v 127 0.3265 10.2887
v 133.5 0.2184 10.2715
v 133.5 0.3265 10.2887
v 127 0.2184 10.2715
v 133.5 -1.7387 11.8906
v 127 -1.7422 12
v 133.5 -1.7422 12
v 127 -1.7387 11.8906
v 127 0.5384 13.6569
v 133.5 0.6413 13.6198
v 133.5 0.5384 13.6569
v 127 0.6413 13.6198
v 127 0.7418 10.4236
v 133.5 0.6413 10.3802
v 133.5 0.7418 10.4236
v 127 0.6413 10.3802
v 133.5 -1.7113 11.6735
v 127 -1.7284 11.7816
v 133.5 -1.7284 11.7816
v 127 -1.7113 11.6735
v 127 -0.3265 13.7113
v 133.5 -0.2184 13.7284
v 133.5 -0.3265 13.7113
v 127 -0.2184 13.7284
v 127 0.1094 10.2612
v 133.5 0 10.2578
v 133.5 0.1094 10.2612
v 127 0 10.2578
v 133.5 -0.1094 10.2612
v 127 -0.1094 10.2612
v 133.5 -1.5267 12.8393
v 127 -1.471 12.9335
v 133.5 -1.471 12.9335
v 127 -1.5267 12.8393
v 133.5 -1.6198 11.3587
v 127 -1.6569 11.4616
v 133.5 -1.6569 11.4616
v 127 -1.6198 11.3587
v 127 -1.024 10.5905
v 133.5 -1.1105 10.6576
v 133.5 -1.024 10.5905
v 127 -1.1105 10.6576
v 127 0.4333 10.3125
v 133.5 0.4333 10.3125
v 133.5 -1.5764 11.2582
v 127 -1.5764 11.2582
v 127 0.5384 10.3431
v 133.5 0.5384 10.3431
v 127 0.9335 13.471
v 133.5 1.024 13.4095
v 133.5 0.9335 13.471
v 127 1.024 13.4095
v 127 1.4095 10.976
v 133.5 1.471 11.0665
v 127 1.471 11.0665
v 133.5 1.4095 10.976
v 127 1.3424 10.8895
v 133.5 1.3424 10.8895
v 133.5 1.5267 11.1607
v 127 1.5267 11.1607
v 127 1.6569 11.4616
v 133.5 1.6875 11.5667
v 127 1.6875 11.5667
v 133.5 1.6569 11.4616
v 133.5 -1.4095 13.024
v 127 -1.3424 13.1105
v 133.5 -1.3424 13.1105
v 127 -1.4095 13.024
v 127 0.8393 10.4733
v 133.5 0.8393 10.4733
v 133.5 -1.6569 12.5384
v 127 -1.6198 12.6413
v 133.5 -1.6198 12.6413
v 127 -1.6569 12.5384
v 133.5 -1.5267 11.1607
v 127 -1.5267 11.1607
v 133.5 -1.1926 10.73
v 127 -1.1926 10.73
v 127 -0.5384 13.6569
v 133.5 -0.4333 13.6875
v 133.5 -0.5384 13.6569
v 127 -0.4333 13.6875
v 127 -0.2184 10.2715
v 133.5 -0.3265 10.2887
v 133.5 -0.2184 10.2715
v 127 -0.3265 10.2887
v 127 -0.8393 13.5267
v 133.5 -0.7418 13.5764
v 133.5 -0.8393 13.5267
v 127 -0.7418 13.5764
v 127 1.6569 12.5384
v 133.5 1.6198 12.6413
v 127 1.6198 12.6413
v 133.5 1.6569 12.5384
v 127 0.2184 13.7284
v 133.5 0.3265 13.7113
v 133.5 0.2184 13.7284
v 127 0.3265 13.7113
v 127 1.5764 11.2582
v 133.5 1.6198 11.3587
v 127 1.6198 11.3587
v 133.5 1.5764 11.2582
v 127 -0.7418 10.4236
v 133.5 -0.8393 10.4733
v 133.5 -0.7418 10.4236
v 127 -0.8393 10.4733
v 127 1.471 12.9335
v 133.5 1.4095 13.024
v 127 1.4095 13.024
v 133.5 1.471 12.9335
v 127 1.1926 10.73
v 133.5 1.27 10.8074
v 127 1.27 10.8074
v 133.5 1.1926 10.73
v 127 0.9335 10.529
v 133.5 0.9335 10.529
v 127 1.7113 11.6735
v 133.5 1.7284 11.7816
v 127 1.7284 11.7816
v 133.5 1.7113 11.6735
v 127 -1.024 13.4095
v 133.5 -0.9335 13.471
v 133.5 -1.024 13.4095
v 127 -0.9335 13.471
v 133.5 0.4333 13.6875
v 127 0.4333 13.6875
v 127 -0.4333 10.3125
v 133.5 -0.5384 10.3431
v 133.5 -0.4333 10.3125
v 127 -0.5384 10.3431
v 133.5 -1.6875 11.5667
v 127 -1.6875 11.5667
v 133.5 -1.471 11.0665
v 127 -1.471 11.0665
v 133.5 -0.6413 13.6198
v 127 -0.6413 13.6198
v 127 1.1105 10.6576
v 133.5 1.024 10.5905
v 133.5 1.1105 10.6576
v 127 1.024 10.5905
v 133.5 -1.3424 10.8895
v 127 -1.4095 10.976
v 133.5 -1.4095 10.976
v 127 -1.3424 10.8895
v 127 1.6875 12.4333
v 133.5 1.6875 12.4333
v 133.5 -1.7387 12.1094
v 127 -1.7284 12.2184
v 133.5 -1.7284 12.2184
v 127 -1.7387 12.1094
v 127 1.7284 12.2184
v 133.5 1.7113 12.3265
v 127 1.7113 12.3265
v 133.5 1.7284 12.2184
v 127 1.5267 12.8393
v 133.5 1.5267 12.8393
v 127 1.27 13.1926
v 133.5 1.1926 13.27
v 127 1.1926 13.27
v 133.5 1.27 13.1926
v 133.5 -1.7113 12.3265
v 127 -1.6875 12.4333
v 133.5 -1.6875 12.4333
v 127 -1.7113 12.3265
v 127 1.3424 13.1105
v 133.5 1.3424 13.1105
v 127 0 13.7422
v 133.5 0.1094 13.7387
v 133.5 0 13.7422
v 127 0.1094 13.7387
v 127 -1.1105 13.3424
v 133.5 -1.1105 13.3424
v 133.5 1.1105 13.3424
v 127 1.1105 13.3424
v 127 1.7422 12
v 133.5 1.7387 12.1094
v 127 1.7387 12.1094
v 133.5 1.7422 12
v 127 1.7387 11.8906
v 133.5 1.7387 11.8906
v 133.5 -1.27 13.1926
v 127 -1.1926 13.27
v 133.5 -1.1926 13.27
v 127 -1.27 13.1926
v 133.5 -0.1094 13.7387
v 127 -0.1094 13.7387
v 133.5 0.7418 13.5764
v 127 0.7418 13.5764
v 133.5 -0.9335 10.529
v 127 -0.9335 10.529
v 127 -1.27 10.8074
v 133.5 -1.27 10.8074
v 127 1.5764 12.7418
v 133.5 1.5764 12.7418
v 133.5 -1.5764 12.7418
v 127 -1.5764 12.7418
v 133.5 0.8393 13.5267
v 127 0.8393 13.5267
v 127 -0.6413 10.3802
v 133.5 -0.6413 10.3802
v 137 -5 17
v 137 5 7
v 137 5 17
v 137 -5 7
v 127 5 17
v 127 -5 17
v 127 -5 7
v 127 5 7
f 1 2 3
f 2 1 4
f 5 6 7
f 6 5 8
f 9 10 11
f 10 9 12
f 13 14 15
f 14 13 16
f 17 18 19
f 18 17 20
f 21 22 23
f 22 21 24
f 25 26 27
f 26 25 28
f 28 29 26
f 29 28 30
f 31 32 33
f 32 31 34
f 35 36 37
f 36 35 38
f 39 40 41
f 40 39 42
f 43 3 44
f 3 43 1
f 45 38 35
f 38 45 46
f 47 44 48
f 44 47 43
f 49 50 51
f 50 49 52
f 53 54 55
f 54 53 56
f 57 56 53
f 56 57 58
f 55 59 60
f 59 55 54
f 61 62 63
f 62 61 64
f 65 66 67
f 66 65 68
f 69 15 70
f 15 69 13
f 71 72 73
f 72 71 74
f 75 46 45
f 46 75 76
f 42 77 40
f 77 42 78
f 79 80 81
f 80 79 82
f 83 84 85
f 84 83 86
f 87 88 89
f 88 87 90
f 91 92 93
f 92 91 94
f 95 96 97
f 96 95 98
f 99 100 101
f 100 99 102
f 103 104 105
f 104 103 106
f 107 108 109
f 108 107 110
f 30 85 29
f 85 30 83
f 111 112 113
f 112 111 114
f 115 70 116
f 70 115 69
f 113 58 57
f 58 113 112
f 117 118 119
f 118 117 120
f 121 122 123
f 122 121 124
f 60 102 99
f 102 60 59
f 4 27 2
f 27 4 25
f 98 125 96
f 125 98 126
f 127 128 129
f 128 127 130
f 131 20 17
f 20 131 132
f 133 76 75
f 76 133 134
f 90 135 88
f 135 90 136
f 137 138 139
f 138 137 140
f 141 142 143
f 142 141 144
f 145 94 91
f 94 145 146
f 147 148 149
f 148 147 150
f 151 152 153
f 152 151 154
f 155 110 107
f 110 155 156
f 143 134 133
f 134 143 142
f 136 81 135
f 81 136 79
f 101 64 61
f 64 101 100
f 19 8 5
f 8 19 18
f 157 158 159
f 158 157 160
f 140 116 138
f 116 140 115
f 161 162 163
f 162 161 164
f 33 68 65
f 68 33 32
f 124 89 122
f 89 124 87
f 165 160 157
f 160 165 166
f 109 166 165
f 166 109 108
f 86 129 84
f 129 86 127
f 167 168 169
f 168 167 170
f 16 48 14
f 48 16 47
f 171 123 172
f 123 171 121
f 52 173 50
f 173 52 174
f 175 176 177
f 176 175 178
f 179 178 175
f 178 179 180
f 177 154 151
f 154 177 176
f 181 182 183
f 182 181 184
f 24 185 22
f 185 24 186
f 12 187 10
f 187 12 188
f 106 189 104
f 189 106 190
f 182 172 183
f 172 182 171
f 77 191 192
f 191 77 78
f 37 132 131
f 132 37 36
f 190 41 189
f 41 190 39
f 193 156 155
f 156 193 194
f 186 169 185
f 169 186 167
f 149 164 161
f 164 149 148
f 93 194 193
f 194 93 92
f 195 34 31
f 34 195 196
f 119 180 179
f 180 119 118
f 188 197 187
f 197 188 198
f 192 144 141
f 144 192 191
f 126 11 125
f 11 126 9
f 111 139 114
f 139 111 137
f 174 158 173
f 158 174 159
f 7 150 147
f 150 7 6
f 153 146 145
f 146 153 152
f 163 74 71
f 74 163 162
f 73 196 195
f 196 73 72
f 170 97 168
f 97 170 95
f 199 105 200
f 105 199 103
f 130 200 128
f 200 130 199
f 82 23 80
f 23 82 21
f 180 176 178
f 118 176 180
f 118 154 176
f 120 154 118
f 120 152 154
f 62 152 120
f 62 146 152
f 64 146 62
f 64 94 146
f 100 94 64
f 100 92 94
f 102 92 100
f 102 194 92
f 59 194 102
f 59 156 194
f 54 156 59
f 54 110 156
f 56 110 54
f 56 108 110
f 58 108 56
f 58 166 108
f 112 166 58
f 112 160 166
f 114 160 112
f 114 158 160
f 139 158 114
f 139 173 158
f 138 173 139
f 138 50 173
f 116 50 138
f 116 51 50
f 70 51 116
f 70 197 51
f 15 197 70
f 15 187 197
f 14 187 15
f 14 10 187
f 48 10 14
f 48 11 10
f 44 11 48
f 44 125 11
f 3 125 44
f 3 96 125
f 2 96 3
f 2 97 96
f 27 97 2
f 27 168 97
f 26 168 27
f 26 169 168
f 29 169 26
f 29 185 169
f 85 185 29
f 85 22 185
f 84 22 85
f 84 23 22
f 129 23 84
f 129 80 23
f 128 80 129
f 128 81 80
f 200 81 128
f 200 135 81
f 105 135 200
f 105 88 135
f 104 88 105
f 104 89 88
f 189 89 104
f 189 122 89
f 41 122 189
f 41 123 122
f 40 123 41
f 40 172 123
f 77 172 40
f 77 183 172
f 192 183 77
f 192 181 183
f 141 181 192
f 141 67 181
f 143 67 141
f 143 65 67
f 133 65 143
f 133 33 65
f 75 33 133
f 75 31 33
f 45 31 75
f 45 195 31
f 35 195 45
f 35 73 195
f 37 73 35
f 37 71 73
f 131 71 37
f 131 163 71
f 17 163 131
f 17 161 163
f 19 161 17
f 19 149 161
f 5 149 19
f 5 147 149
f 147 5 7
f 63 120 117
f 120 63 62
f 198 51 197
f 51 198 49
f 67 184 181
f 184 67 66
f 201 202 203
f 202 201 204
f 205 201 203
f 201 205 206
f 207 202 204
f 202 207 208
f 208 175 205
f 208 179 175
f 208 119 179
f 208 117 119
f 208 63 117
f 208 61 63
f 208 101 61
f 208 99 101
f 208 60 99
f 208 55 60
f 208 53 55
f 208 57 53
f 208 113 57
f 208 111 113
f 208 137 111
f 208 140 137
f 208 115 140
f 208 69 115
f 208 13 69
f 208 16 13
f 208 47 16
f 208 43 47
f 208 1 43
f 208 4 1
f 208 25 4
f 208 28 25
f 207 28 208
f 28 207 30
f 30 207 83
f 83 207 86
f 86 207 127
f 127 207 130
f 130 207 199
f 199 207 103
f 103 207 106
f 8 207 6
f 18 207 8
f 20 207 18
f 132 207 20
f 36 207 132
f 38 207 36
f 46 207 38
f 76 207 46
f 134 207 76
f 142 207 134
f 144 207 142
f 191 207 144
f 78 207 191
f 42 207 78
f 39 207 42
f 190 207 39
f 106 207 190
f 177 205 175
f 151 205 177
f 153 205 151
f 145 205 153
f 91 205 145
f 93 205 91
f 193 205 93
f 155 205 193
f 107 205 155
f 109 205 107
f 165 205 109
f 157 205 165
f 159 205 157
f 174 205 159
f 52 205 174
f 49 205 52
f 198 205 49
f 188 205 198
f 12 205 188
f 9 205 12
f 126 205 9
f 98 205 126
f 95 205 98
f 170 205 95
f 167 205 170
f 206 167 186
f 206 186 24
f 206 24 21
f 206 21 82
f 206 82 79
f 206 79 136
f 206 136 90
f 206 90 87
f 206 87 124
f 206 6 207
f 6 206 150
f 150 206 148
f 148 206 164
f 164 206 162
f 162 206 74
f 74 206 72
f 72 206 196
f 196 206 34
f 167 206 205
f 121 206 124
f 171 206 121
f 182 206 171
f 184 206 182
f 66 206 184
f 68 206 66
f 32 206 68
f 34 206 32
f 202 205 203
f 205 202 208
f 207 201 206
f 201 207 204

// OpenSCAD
// file: ../hex_nut.scad
// 1.5^2 + y^2 = 3^2
// sqrt(3^2 - 1.5^2)
//       30
//    /   |
// 60  - 90
// cos(30) = x / 3
// x = 3 cos(30)
module hex(side_length=4) {
  points = [[0,0], [side_length, 0], [side_length / 2, side_length * cos(30)]];
  for (i=[0:1:5]) {
    rotate([0,0,i * 60]) polygon(points);
  }
}

module hex_nut(side_length=3, height=2) {
    linear_extrude(height=height) hex(side_length);

}
// file: ../cr_boxes/handle.scad
use <../smoothed_cube.scad>
use <../screw_with_nut.scad>

$fn = 100;
x = 40.2;
y = 25.4;
z = 5;
h = 127;

function get_x_handle() = x;
threaded_height = 8;


module top() {
  translate([-x / 2 ,-y / 2,-z / 2]) {
    smoothed_cube(x=x, y = y, z=z);
  }
}

module screw_holder(x=5, y=y, z=y, radius=5) {
  translate([-x / 2 ,-y / 2,-z / 2]) {
    smoothed_cube(
      x=x, y = y, z=z,
      radius_3=radius,
      radius_7=radius,
      edge_2_3_radius=radius,
      edge_3_7_radius=radius,
      edge_3_4_radius=radius,
      edge_6_7_radius=radius,
      edge_7_8_radius=radius
    );
  }
}

module handle(screws_only=false) {
  if (screws_only) {
    screws_for_handle();
  } else {

    cylinder(h=h, r=25.4 / 2, center=true);
    difference() {
      union() {

        translate([-x,0,-h / 2 - 8]) {
          screw_holder();
        }

        mirror([0,0,1])
          translate([-x,0,-h / 2 - 8]) {
            screw_holder();
          }

        translate([-x / 2,0, h / 2 - z / 2]) {
          top();
        }

        mirror([0,0,1])
          translate([-x / 2,0, h / 2 - z / 2]) {
            top();
          }
      }
      screws_for_handle();
    }
  }
}

module screws_for_handle() {
  screw_handle();
  mirror([0,0,1])
    screw_handle();
}

module screw_handle(screw_offset=5) {
  translate([-x + threaded_height - screw_offset,0,h / 2 + y /2  -2]) {
    color([1,0,0])
      rotate([0,-90,0])
      screw_with_nut(threaded_height=threaded_height);
  }
}

handle();
// file: ../cr_boxes/corner.scad
use <builder.scad>
use <row_fan.scad>

filter_y = filter_dim()[1];
fan_size = get_fan_size();
depth = get_depth();
corner_z = get_corner_z();



module corner() {
  difference() {

    // translate([-depth, -(filter_y * 2 + fan_size) / 2, 0]) {
    union() {

      cube([depth,filter_y * 2 + fan_size,corner_z], center=true);

      mirror([0,1,0])
      translate([(get_spacing_x() + get_fan_size()) / 2 + 0.5,0, -corner_z / 2 + depth / 2]) {
        cylinder_cube_screw(cyl=false, screw=false, cube_support=true);
      }

      // cylinder 2
      translate([get_spacing_x() - 0.5,0,0]) {
        translate([(get_spacing_x() + get_fan_size()) / 2 + 0.5,0, -corner_z / 2 + depth / 2]) {
          cylinder_cube_screw(cyl=true, screw=false, cube_support=false);
        }
      }

      // cylinder 3 top
      translate([22,0,40]) {
        rotate([0,90,0])
          mirror([0,1,0])
          translate([get_spacing_x() - 0.5,0,0]) {
            translate([(get_spacing_x() + get_fan_size()) / 2 + 0.5,0, -corner_z / 2 + depth / 2]) {
              cylinder_cube_screw(cyl=true, screw=false, cube_support=false);
            }
          }
      }

      // cube top
    }
    union() {


      // cylinder screw hole 1
      mirror([0,1,0])
        translate([(get_spacing_x() + get_fan_size()) / 2 + 0.5,0, -corner_z / 2 + depth / 2]) {
          cylinder_cube_screw(cyl=true, screw=true, cube_support=false);
        }

      // cylinder 2 screw hole
      translate([get_spacing_x() - 0.5,0,0]) {
        translate([(get_spacing_x() + get_fan_size()) / 2 + 0.5,0, -corner_z / 2 + depth / 2]) {
          cylinder_cube_screw(cyl=false, screw=true, cube_support=false);
        }
      }

      // cylinder 3 screw hole
      translate([22,0,40]) {
        rotate([0,90,0])
          mirror([0,1,0])
          translate([get_spacing_x() - 0.5,0,0]) {
            translate([(get_spacing_x() + get_fan_size()) / 2 + 0.5,0, -corner_z / 2 + depth / 2]) {
              cylinder_cube_screw(cyl=false, screw=true, cube_support=false);
            }
          }
      }

      // cylinder 4 screw hole and cylinder
      translate([22,0,23]) {
        rotate([0,90,0])
          translate([(get_spacing_x() + get_fan_size()) / 2 + 0.5,0, -corner_z / 2 + depth / 2]) {
            cylinder_cube_screw(cyl=true, screw=true, cube_support=false);
          }
      }
    }
  }
}

corner();
// file: ../fan.scad
use <hex_nut.scad>
$fn = 100;

// | 70
// |
// |
// |
// |        62.5
// -------------

module fan(
    radius,
    depth,
    screw_radius,
    multiplier = 70 - 7.5
) {
  _distance_to_middle_of_circle_x = radius == 60 ? 52.5 : multiplier / 70 * radius;
  _distance_to_middle_of_circle_y = radius == 60 ? 52.5 : multiplier / 70 * radius;

  linear_extrude(height=depth) circle(radius);
  // top right corner
  translate([_distance_to_middle_of_circle_x, _distance_to_middle_of_circle_y, 0]) {
    linear_extrude(height=depth) circle(screw_radius);
  }

  // bottom left corner
  translate([-_distance_to_middle_of_circle_x, -_distance_to_middle_of_circle_y, 0]) {
    linear_extrude(height=depth) circle(screw_radius);
  }

  // bottom right corner
  translate([_distance_to_middle_of_circle_x, -_distance_to_middle_of_circle_y, 0]) {
    linear_extrude(height=depth) circle(screw_radius);
  }

  // top left corner
  translate([-_distance_to_middle_of_circle_x, _distance_to_middle_of_circle_y, 0]) {
    linear_extrude(height=depth) circle(screw_radius);
  }

  // hex nut 1
  translate([_distance_to_middle_of_circle_x, _distance_to_middle_of_circle_y, depth - 2]) {
    hex_nut(4);
  }

  // hex nut 2
  translate([-_distance_to_middle_of_circle_x, -_distance_to_middle_of_circle_y, depth - 2]) {
    hex_nut(4);
  }

  // hex nut 3
  translate([_distance_to_middle_of_circle_x, -_distance_to_middle_of_circle_y, depth - 2]) {
    hex_nut(4);
  }

  // hex nut 4
  translate([-_distance_to_middle_of_circle_x, _distance_to_middle_of_circle_y, depth - 2]) {
    hex_nut(4);
  }
}

fan(radius=60, depth=5, distance_to_middle_of_circle_x=62/70 * 60, distance_to_middle_of_circle_y=62/70 * 60);
// file: foot.scad
use <../screw_with_nut.scad>
$fn = 100;

module cone(width=5, height=10, cone_top_radius=8) {
  rotate_extrude(convexity=10, angle=360)
    polygon([[0,0], [width,0], [cone_top_radius, height], [0,height]]);
}

module foot(fan_size=120, screw=false, height=10, screw_head_height=5) {
  if (screw) {
    rotate([-90,0,0]) screw_with_nut(nut_type="hex", threaded_height=10, screw_head_height=screw_head_height);
  } else {
    rotate([-90,0,0]) difference() {
      cone(height=height);
      screw_with_nut(nut_type="hex", threaded_height=10, screw_head_height=screw_head_height);
    }
  }
}


foot();
// screw_with_nut(nut_type="none", threaded_height=10);
// file: ../usbc_female.scad
$fn=100;
function usbc_radius() = 3.25;
function usbc_middle_width() = 6.5;
function usbc_width() = 2 * usbc_radius() + usbc_middle_width();

module usbc_female() {
  // left half cylinder
  rotate([-90,0,0]) cylinder(h=20, r=usbc_radius());

  translate([0,0,-usbc_radius()]) {
    cube([7,20,usbc_middle_width()]);
  }

  // right half cylinder
  translate([7,0,0]) {
    rotate([-90,0,0]) cylinder(h=20, r=usbc_radius());
  }
}

usbc_female();
// file: ../cr_boxes/builder.scad
use <../smoothed_cube.scad>
use <../screw_with_nut.scad>
use <../fan.scad>
use <row_fan.scad>
use <corner.scad>
use <handle.scad>

filter_x = 635;
filter_z = 406;
filter_y = 25;
fan_z = 27;
num_fans = 4;
fan_size = 140;
depth = 10;

function filter_dim() = [filter_x, filter_y, filter_z];
function get_fan_size() = fan_size;
function get_num_fans() = num_fans;
function get_depth() = depth;
function get_spacing_x() = (filter_x / get_num_fans() - get_fan_size() )/ 2;
function get_spacing_y() = (filter_y / get_num_fans() - get_fan_size() )/ 2;
function get_fan_holder_x() = get_spacing_x() * 2 + get_fan_size();
function num_fans_to_fit(dim) = floor(dim / get_fan_holder_x());
function get_corner_z() = (filter_z + 2 * depth - 2 * (get_spacing_x() * 2 + get_fan_size())) / 2;;

module local_fan(z_offset="None", size=140, z=27, _color=[1,1,1], depth=10) {
  _z_offset = z_offset == "None" ? filter_z : z_offset;

  translate([0,0, filter_z]) {
    color(_color)
    cube([size,size,z]);

    // translate([0,0,50]) {
      // rotate([180,0,0])
      // screw_with_nut(threaded_height=8, hex_nut_side_length=4.5);
    // }
  }

  // main cylinder plus screws
  translate([fan_size / 2, fan_size / 2,_z_offset + fan_z  + 10]) {
    rotate([180,0,0])
    fan(size / 2, depth, screw_radius=2.5);
    // color(_color)
    // cylinder(h=depth, r=size / 2);
  }
}

module filter(filter_x=635, filter_y=25, filter_z=406) {
  cube([filter_x, filter_y, filter_z]);
}

module top_or_bottom_panel() {
  smoothed_cube(
      x=filter_x + 2 * depth,
      y=2 * filter_y + fan_size,
      z=depth,
      radius_1=depth,
      radius_4=depth,
      radius_5=depth,
      radius_8=depth,
      edge_4_1_radius=depth,
      edge_1_5_radius=depth,
      edge_8_5_radius=depth,
      edge_4_8_radius=depth
      );
}

module fans() {
  translate([get_spacing_x() + get_fan_size() / 2, 0,0]) {
    for (x=[0:1:get_num_fans() - 1]) {
      translate([(get_spacing_x() * 2 + get_fan_size()) * x,0,0]) {
        row_fan();
      }
    }
  }
}

module vertical_wall(with_handle=false, row_wall_index=0) {

  if (!with_handle) {
    translate([- depth / 2,0, get_fan_holder_x() / 2]) {
      rotate([0,-90,0]) {
        for (x=[0:1: num_fans_to_fit(filter_z) - 1]) {
          translate([(get_spacing_x() * 2 + get_fan_size()) * x,0,0]) {
            row_fan(fan_hole=false);
          }
        }
      }
    }
  } else {
    difference() {
      translate([- depth / 2,0, get_fan_holder_x() / 2]) {
        rotate([0,-90,0]) {
          translate([(get_spacing_x() * 2 + get_fan_size()) * row_wall_index,0,0]) {
            row_fan(fan_hole=false);
          }
        }
      }

      translate([-get_x_handle() - 15,0,get_spacing_x() * 2 + get_fan_size()]) {
        color([0,0,1])
          rotate([0,0,180])
          handle(screws_only=true);
      }
    }
  }
}

module filters() {
  filter();
  translate([0,fan_size + filter_y,0]) {
    filter();
  }
}


translate([0,0,filter_z + 5 + depth]) {
  fans();
}

// bottom fans
translate([0,0,depth / 2]) {
  mirror([0,0,1])
   fans();
}

translate([0,-filter_y -get_fan_size() / 2, depth]) {
  filters();
}

// echo("get_fan_holder_x()", get_fan_holder_x());
// echo("num_fans_to_fit(filter_z)", num_fans_to_fit(filter_z));

corner_z = get_corner_z();
echo("corner_z:", corner_z);

translate([-get_depth() / 2,0, corner_z / 2]) {
  // corner();
}

translate([-get_depth() / 2, 0, corner_z + 2 * (get_spacing_x() * 2 + get_fan_size())]) {
  corner();
}

translate([0,0,corner_z]) {
  vertical_wall();
}
// file: ../cr_boxes/row_fan.scad
use <builder.scad>
use <../smoothed_cube.scad>
use <../screw_with_nut.scad>

$fn = 100;

filter_x = filter_dim()[0];
filter_y = filter_dim()[1];
filter_z = filter_dim()[2];

width = filter_x / get_num_fans();
spacing_x = get_spacing_x();
spacing_y = filter_y;

module top(x, y, z, depth, corners_smoothed=false, x_edges_smoothed=false,
    x_spacing=10,
    y_spacing=10,
    z_spacing=10,
    edge_fan_top_smoothed=false,
    edge_fan_bottom_smoothed=false,
    edge_fan_left_smoothed=false,
    edge_fan_right_smoothed=false,
    edge_top_left_smoothed=false,
    edge_top_right_smoothed=false,
    edge_bottom_left_smoothed=false,
    edge_bottom_right_smoothed=false,
    top_left_corner_smoothed=false,
    top_right_corner_smoothed=false,
    bottom_left_corner_smoothed=false,
    bottom_right_corner_smoothed=false
) {
  corner_radius = corners_smoothed ? depth : 0;
  x_edge_radius = x_edges_smoothed ? depth : 0;

  top_edge_radius = edge_fan_top_smoothed ? depth : 0;
  bottom_edge_radius = edge_fan_bottom_smoothed ? depth : 0;
  left_edge_radius = edge_fan_left_smoothed ? depth : 0;
  right_edge_radius = edge_fan_right_smoothed ? depth : 0;

  top_left_edge_radius = edge_top_left_smoothed ? depth : 0;
  top_right_edge_radius = edge_top_right_smoothed ? depth : 0;
  bottom_right_edge_radius = edge_bottom_right_smoothed ? depth : 0;
  bottom_left_edge_radius = edge_bottom_left_smoothed ? depth : 0;

  top_left_corner_radius = top_left_corner_smoothed ? depth : 0;
  bottom_left_corner_radius = bottom_left_corner_smoothed ? depth : 0;
  top_right_corner_radius = top_right_corner_smoothed ? depth : 0;
  bottom_right_corner_radius = bottom_right_corner_smoothed ? depth : 0;


  difference() {
    smoothed_cube(
        x=x,
        y=y,
        z=z,
        radius_1=bottom_left_corner_radius,
        radius_4=bottom_right_corner_radius,
        radius_5=top_left_corner_radius,
        radius_8=top_right_corner_radius,
        edge_8_5_radius=top_edge_radius,
        edge_4_1_radius=bottom_edge_radius,
        edge_1_5_radius=left_edge_radius,
        edge_4_8_radius=right_edge_radius,
        edge_5_6_radius=top_left_edge_radius,
        edge_7_8_radius=top_right_edge_radius,
        edge_3_4_radius=bottom_right_edge_radius,
        edge_1_2_radius=bottom_left_edge_radius

        );
    translate([depth, depth,0]) {
      cube([x - 2 * depth , y - 2 * depth , z - depth]);
    }
  }
}


module some_fan(x_spacing="None", y_spacing="None", z_spacing="None") {
  _x_spacing = x_spacing == "None" ? spacing_x : x_spacing;
  _y_spacing = y_spacing == "None" ? spacing_y : y_spacing;
  _z_spacing = z_spacing == "None" ? -filter_z - 27 : z_spacing;

  translate([_x_spacing, _y_spacing,_z_spacing]) {
    local_fan();
  }
}



module cylinder_cube_screw(cyl=true, screw=true, cube_support=true, cylinder_offset=0) {
  // cylinder 1 (hole)
  if (cyl) {
    translate([-spacing_x - get_fan_size() / 2,get_fan_size() / 2,0]) {
      rotate([0,90,0])
        cylinder(h=spacing_x, r=get_depth() / 2 - 2 - cylinder_offset);
    }
  }

  if (cube_support) {
    // cube support
    translate([-spacing_x / 2 - get_fan_size() / 2 ,get_fan_size() / 2, -get_depth() / 2]) {
      color([0,1,0])
        cube([8,8,8], center=true);
    }
  }

  if (screw) {
    // screw 1
    translate([-spacing_x / 2 - get_fan_size() / 2,get_fan_size() / 2,-10]) {
      screw_with_nut(nut_type="None", threaded_height=8);
    }
  }
}

// one_side();

// rotate([0,0,180]) one_side();

module top_spaced(
    width,
    length="None",
    fan_hole=true,
    depth="None",
    trans_x="None",
    trans_y="None",
    z="None",
    x_spacing="None",
    y_spacing="None",
    z_spacing="None",
    z_offset=15,
    edge_fan_top_smoothed=false,
    edge_fan_bottom_smoothed=false,
    edge_fan_left_smoothed=false,
    edge_fan_right_smoothed=false,
    edge_top_left_smoothed=false,
    edge_top_right_smoothed=false,
    edge_bottom_left_smoothed=false,
    edge_bottom_right_smoothed=false,
    top_left_corner_smoothed=false,
    top_right_corner_smoothed=false,
    bottom_left_corner_smoothed=false,
    bottom_right_corner_smoothed=false,
    fan_diameter=140
    ) {
      // x_spacing: the space in the x direction between the edge of a fan and edge
      // the container
      _depth = depth == "None" ? get_depth() : depth;
      _trans_x = trans_x == "None" ? -width / 2 : trans_x;
      _trans_y = trans_y == "None" ? -length / 2 : trans_y;
      _length = length == "None" ? get_fan_size() + y_spacing * 2 : length;
      _z = z == "None" ? _depth : z;

      difference() {
        translate([_trans_x,_trans_y, 0]) {
          color([1,0,0])
            top(x=width, y = _length, z=_z, depth=_depth,
                x_spacing=x_spacing,
                y_spacing=y_spacing,
                z_spacing=z_spacing,
                edge_fan_top_smoothed=edge_fan_top_smoothed,
                edge_fan_bottom_smoothed=edge_fan_bottom_smoothed,
                edge_fan_left_smoothed=edge_fan_left_smoothed,
                edge_fan_right_smoothed=edge_fan_right_smoothed,
                edge_top_left_smoothed=edge_top_left_smoothed,
                edge_top_right_smoothed=edge_top_right_smoothed,
                edge_bottom_left_smoothed=edge_bottom_left_smoothed,
                edge_bottom_right_smoothed=edge_bottom_right_smoothed,
                top_left_corner_smoothed=top_left_corner_smoothed,
                top_right_corner_smoothed=top_right_corner_smoothed,
                bottom_left_corner_smoothed=bottom_left_corner_smoothed,
                bottom_right_corner_smoothed=bottom_right_corner_smoothed
               );

        }
        if (fan_hole) {
          translate([-width / 2, -length / 2,z_spacing]) {
            local_fan(
              z_offset=z_offset,
              size=fan_diameter,
              depth = _depth + 5
            );
          }
        }
      }
      // translate([-width / 2, -length / 2,z_spacing]) {
        // local_fan(
          // z_offset=z_offset,
          // size=fan_diameter,
          // depth = _depth + 5
        // );
      // }
    }

module row_fan(fan_hole=true) {
  rotate([180,0,0])
  difference() {
    union() {
      top_spaced(fan_hole=fan_hole, width=filter_x / get_num_fans());
      cylinder_cube_screw(cube_support=true, screw=false, cyl=false);

      translate([-spacing_x,-get_fan_size(),0]) {
        cylinder_cube_screw(cyl=true, screw=false, cube_support=false, cylinder_offset=0.5);
      }

      rotate([0,0,180])
        cylinder_cube_screw(cube_support=true, screw=false, cyl=false);

      rotate([0,0,180])
        translate([-spacing_x,-get_fan_size(),0]) {
          cylinder_cube_screw(cyl=true, screw=false, cube_support=false, cylinder_offset=0.5);
        }
    }

    union() {
      cylinder_cube_screw(cube_support=false, screw=true, cyl=true);

      translate([-spacing_x,-get_fan_size(),0]) {
        cylinder_cube_screw(cyl=false, screw=true, cube_support=false);
      }

      rotate([0,0,180])
        cylinder_cube_screw(cube_support=false, screw=true, cyl=true);

      rotate([0,0,180])
        translate([-spacing_x,-get_fan_size(),0]) {
          cylinder_cube_screw(cyl=false, screw=true, cube_support=false);
        }
    }
  }

  if (fan_hole) {
    finger_guard();
  }
}


module finger_guard(fan_size=140, depth=get_depth()) {

  translate([0,0,depth/2]) {
    for (x=[fan_size / 2:-12:0]) {
      difference() {
        cylinder(h=depth / 2, r=x);
        cylinder(h=depth / 2, r=x - 3);
      }
    }
  }

  translate([0,0,depth - 1.25]) {
    cube([fan_size, 3, depth / 2], center=true);
    rotate([0,0,90])
      cube([fan_size, 3, depth / 2], center=true);
  }
}

// top_spaced();
row_fan(fan_hole=false);
// file: ../nut.scad
// 1.5^2 + y^2 = 3^2
// sqrt(3^2 - 1.5^2)
//       30
//    /   |
// 60  - 90
// cos(30) = x / 3
// x = 3 cos(30)
module hex(side_length=3) {
  points = [[0,0], [side_length, 0], [side_length / 2, side_length * cos(30)]];
  for (i=[0:1:5]) {
    rotate([0,0,i * 60]) polygon(points);
  }
}

module hex_nut(side_length=3, height=2) {
    linear_extrude(height=height) hex(side_length);
}

module square_nut(side_length=5, height=2, _offset=0) {
    cube([5 + _offset,5,2]);
}
// file: ../screw.scad
$fn=100;

module screw(screw_head_radius=3, screw_head_height=3, threaded_radius=1.5, threaded_height=10) {
  // screw head
  cylinder(h=screw_head_height, r=screw_head_radius);

  translate([0, 0, screw_head_height]) {
    cylinder(h=threaded_height, r=threaded_radius);
  }
}

// m3x10
screw(screw_head_radius=3, screw_head_height=3, threaded_radius=1.5, threaded_height=10);
// file: ../smoothed_edge.scad
module smoothed_edge(radius=1.5, height=64) {
  difference() {
    difference() {
      color([1, 0, 0]) cylinder(h=height, r=radius);
      translate([-radius, 0, 0]) {
        color([0, 1, 0]) cube([radius * 2, radius, height]);
      }
    }

    translate([0, -radius, 0]) {
      color([0, 1, 0]) cube([radius, radius * 2, height]);
    }
  }
}
// file: ../smoothed_corner.scad
$fn=200;
module smoothed_corner(radius=5) {
  difference() {
    sphere(radius);
    union() {
      translate([0,-5,-5]) {
        cube([5,10,10]);
      }

      translate([-10,0,-5]) {
        cube([10, 10, 10]);
      }

      translate([-5,-5,0]) {
        cube([10,10,10]);
      }
    }

  }
}

smoothed_corner();
// file: ../cone.scad
module cone(width=5, height=10, cone_top_radius=8) {
  rotate_extrude(convexity=10, angle=360)
    polygon([[0,0], [width,0], [cone_top_radius, height], [0,height]]);
}
// file: ../screw_with_nut.scad
use <screw.scad>
use <nut.scad>

module screw_with_nut(
  hex_nut_height=2.5,
  screw_head_height=3,
  threaded_height=10,
  threaded_radius=1.5,
  screw_head_radius=3,
  hex_nut_side_length=3.6,
  square_nut_height=2,
  square_nut_side_length=5,
  nut_type="hex"
) {
  screw(screw_head_radius=screw_head_radius, screw_head_height=screw_head_height, threaded_radius=threaded_radius, threaded_height=threaded_height);

  if (nut_type == "hex") {
    translate([0,0, screw_head_height + threaded_height - hex_nut_height]) {
      hex_nut(side_length=hex_nut_side_length, height=hex_nut_height);
    }
  }

  else if (nut_type == "square"){
    rotate([0,0,-90])
    translate([
        -square_nut_side_length / 2,
        -square_nut_side_length / 2,
        screw_head_height + threaded_height - square_nut_height
    ]) {
      square_nut(
          side_length=square_nut_side_length,
          height=square_nut_height,
          _offset=5);
    }
  }

}

screw_with_nut(nut_type="square");
// file: ../smoothed_cube.scad
use <smoothed_corner.scad>
use <smoothed_edge.scad>
$fn=100;
//    5   8
// 1   4
//    6   7
// 2   3
// Create a cube
// Remove the edges
// Add smoothed edges
// Remove corner boxes
// Add corners

module smoothed_cube(
  radius_1=0,
  radius_2=0,
  radius_3=0,
  radius_4=0,
  radius_5=0,
  radius_6=0,
  radius_7=0,
  radius_8=0,
  x=300,
  y=200,
  z=100,
  edge_1_2_radius=0,
  edge_2_3_radius=0,
  edge_3_4_radius=0,
  edge_4_1_radius=0,
  edge_1_5_radius=0,
  edge_5_6_radius=0,
  edge_8_5_radius=0,
  edge_6_7_radius=0,
  edge_7_8_radius=0,
  edge_8_4_radius=0,
  edge_2_6_radius=0,
  edge_3_7_radius=0,
  edge_4_8_radius=0,
) {

  difference() {
    union() {
      difference() {
        cube([x, y, z]);
        // remove sharp edges
        union() {
          // edge between vertices 1 and 2
          color([1,0,0]) cube([edge_1_2_radius, edge_1_2_radius,z]);

          // edge between vertices 2 and 3
          color([1,0,0]) cube([x, edge_2_3_radius, edge_2_3_radius]);

          // edge between vertices 3 and 4
          translate([x - edge_3_4_radius, 0, 0]) {
            color([1,0,0]) cube([edge_3_4_radius, edge_3_4_radius,z]);
          }

          // edge between vertices 4 and 1
          translate([0,0,z-edge_4_1_radius]) {
            color([1,0,0]) cube([x, edge_4_1_radius, edge_4_1_radius]);
          }

          // edge from vertex 1 to 5
          translate([0, 0, z - edge_1_5_radius]) {
            color([1,0,0]) cube([edge_1_5_radius,y,edge_1_5_radius]);
          }

          // edge from vertex 2 to 6
          translate([0, 0,0]) {
            color([1,0,0]) cube([edge_2_6_radius,y,edge_2_6_radius]);
          }

          // edge from vertex 3 to 7
          translate([x - edge_3_7_radius, 0,0]) {
            color([1,0,0]) cube([edge_3_7_radius,y,edge_3_7_radius]);
          }

          // edge from vertex 4 to 8
          translate([x - edge_4_8_radius, 0, z - edge_4_8_radius]) {
            color([1,0,0]) cube([edge_4_8_radius,y, edge_4_8_radius]);
          }

          // edge between vertices 5 and 6
          translate([0,y - edge_5_6_radius,0]) {
            color([1,0,0]) cube([edge_5_6_radius, edge_5_6_radius,z]);
          }

          // edge between vertices 8 and 5
          translate([0,y - edge_8_5_radius,z-edge_8_5_radius]) {
            color([1,0,0]) cube([x, edge_8_5_radius, edge_8_5_radius]);
          }

          // edge between vertices 7 and 8
          translate([x - edge_7_8_radius,y - edge_7_8_radius,0]) {
            color([1,0,0]) cube([edge_7_8_radius, edge_7_8_radius,z]);
          }

          // edge between vertices 6 and 7
          translate([0,y - edge_6_7_radius,0]) {
            color([1,0,0]) cube([x, edge_6_7_radius, edge_6_7_radius]);
          }
        }
      }

      // add smooth edges
      union() {
        // smooth edge from vertex 1 to 2
        translate([edge_1_2_radius, edge_1_2_radius, +radius_2]) {
          smoothed_edge(radius=edge_1_2_radius, height=z - radius_2 - radius_1);
        }

        // smooth edge from vertex 3 to 4
        translate([x - edge_3_4_radius, edge_3_4_radius, +radius_3]) {
          rotate([0,0,90])
            smoothed_edge(radius=edge_3_4_radius, height=z - radius_4 - radius_3);
        }

        // smooth edge from vertex 2 to 3
        translate([radius_2,edge_2_3_radius,edge_2_3_radius]) {
          rotate([90,0,0])
            rotate([0,90,0])
            smoothed_edge(radius=edge_2_3_radius, height=x - radius_3 - radius_2);
        }

        // smooth edge from vertex 4 to 1
        translate([radius_1,edge_4_1_radius,z - edge_4_1_radius]) {
          rotate([0,0,0])
            rotate([0,90,0])
            smoothed_edge(radius=edge_4_1_radius, height=x - radius_4 - radius_1);
        }

        // smooth edge from vertex 1 to 5
        translate([edge_1_5_radius, radius_1, z - edge_1_5_radius]) {
          rotate([-90,0,0])
            smoothed_edge(radius=edge_1_5_radius, height=y - radius_1 - radius_5);
        }

        // smooth edge from vertex 2 to 6
        translate([edge_2_6_radius, radius_2, edge_2_6_radius]) {
          rotate([0,-90,0])
            rotate([-90,0,0])
            smoothed_edge(radius=edge_2_6_radius, height=y - radius_2 - radius_6);
        }

        // smooth edge from vertex 3 to 7
        translate([x - edge_3_7_radius, radius_3, edge_3_7_radius]) {
          rotate([0,180,0])
            rotate([-90,0,0])
            smoothed_edge(radius=edge_3_7_radius, height=y - radius_3 - radius_7);
        }

        // smooth edge from vertex 4 to 8
        translate([x - edge_4_8_radius, radius_4, z - edge_4_8_radius]) {
          rotate([0,90,0])
            rotate([-90,0,0])
            smoothed_edge(radius=edge_4_8_radius, height=y - radius_4 - radius_8);
        }

        // smooth edge from vertex 5 and 6
        translate([edge_5_6_radius, y - edge_5_6_radius, +radius_6]) {
          rotate([0,0,-90])
            smoothed_edge(radius=edge_5_6_radius, height=z - radius_6 - radius_5);
        }

        // smooth edge from vertex 7 to 8
        translate([x - edge_7_8_radius, y - edge_7_8_radius, +radius_7]) {
          rotate([0,0,180])
            smoothed_edge(radius=edge_7_8_radius, height=z - radius_8 - radius_7);
        }

        // smooth edge from vertex 8 to 5
        translate([radius_5,y - edge_8_5_radius,z - edge_8_5_radius]) {
          rotate([-90,0,0])
            rotate([0,90,0])
            smoothed_edge(radius=edge_8_5_radius, height=x - radius_8 - radius_5);
        }

        // smooth edge from vertex 6 to 7
        translate([radius_6,y - edge_6_7_radius,edge_6_7_radius]) {
          rotate([180,0,0])
            rotate([0,90,0])
            smoothed_edge(radius=edge_6_7_radius, height=x - radius_6 - radius_7);
        }
      }
    }
    // remove sharp corners
    union() {
      // vertex 1 spacing
      translate([0,0,z - radius_1]) {
        color([0,0,1]) cube([radius_1, radius_1, radius_1]);
      }

      // vertex 2 spacing
      translate([0,0,0]) {
        color([0,0,1]) cube([radius_2, radius_2, radius_2]);
      }

      // vertex 3 spacing
      translate([x, 0, 0]) {
        rotate([-90,0,0])
          rotate([0,0,-180]) cube(radius_3);
      }

      // vertex 4 spacing
      translate([x, 0, z]) {
        color([1,0,0])  rotate([0,180,0]) cube(radius_4);
      }

      // vertex 5 spacing
      translate([radius_5, y - radius_5, z]) {
        color([1,0,0])  rotate([0,180,0]) cube(radius_5);
      }

      // vertex 6 spacing
      translate([radius_6, y - radius_6, radius_6]) {
        color([1,0,0])  rotate([0,180,0]) cube(radius_6);
      }

      // vertex 7 spacing
      translate([x, y - radius_7, radius_7]) {
        color([1,0,0])  rotate([0,180,0]) cube(radius_7);
      }

      // vertex 8 spacing
      translate([x, y - radius_8, z]) {
        color([1,0,0])  rotate([0,180,0]) cube(radius_8);
      }

    }
  }
  // Add smooth corners

  // smooth corner vertex 2
  translate([radius_2, radius_2, +radius_2]) {
    smoothed_corner(radius=radius_2);
  }

  // smooth corner vertex 1
  translate([radius_1, radius_1, z - radius_1]) {
    rotate([-90,0,0]) smoothed_corner(radius=radius_1);
  }

  // smooth corner vertex 3
  translate([x - radius_3, radius_3, radius_3]) {
    rotate([-90,0,0])
    rotate([0,0,-180]) smoothed_corner(radius=radius_3);
  }

  // smooth corner vertex 4
  translate([x-radius_4, radius_4, z - radius_4]) {
    rotate([0,180,0]) smoothed_corner(radius=radius_4);
  }

  // smooth corner vertex 5
  translate([radius_5, y - radius_5, z - radius_5]) {
    rotate([180,0,0]) smoothed_corner(radius=radius_5);
  }

  // smooth corner vertex 6
  translate([radius_6, y - radius_6,  radius_6 ]) {
    rotate([90,0,0])
    smoothed_corner(radius=radius_6);
  }

  // translate([edge_1_2_radius, edge_1_2_radius, +radius_2]) {
    // smoothed_edge(radius=edge_1_2_radius, height=z - radius_2 - radius_1);
  // }

  // smooth corner vertex 7
  translate([x-radius_7, y - radius_7,  radius_7 ]) {
    rotate([0,-90,0])
    rotate([90,0,0])
    smoothed_corner(radius=radius_7);
  }

  // smooth corner vertex 8
  translate([x-radius_8, y - radius_8,  z - radius_8 ]) {
    rotate([0,180,0])
    rotate([90,0,0])
    smoothed_corner(radius=radius_8);
  }

}


edge_1_2_radius = 5;
edge_2_3_radius = 5;
edge_3_4_radius = 5;
edge_4_1_radius = 5;
edge_1_5_radius = 5;
edge_2_6_radius = 5;
edge_3_7_radius = 5;
edge_4_8_radius = 5;
edge_5_6_radius = 5;
edge_7_8_radius = 5;
edge_8_5_radius = 5;
edge_6_7_radius = 5;
radius_1 = 0;
radius_2 = 0;
radius_3 = 0;
radius_4 = 0;
radius_5 = 0;
radius_6 = 0;
radius_7 = 0;
radius_8 = 0;
x=13;
y = 5;
z=5;

// smoothed_cube(edge_1_2_radius=5, radius_2=5, radius_1=5, edge_2_3_radius=5);
// smoothed_cube(edge_1_2_radius=5, radius_2=5, radius_1=5, edge_2_3_radius=5, edge_3_4_radius=5, radius_3=5, radius_4=5, edge_4_1_radius=5, radius_5=5, edge_1_5_radius=5, edge_2_6_radius=5, radius_6=5, edge_3_7_radius=5, radius_7=5, edge_4_8_radius=5, radius_8 = 5, edge_5_6_radius=5, edge_7_8_radius=5, edge_8_5_radius=5, edge_6_7_radius=5);
  // smooth edge from vertex 6 to 7
smoothed_cube(edge_4_8_radius=5, radius_4=5);
// smoothed_cube(radius_1=5, radius_2=5, edge_1_2_radius=5, edge_2_3_radius=0, edge_4_1_radius=5, edge_1_5_radius=5, edge_2_6_radius=5, edge_4_8_radius=5, radius_4=0, radius_8=0);
// smoothed_cube(radius_1=5, radius_2=5, radius_3=5);
 //smoothed_cube(radius_1=5, radius_2=5, radius_3=5, radius_4=5, radius_5=5, radius_6=5, radius_7=5, radius_8=5);

      // translate([0, 0, z - edge_1_5_radius]) {
        // color([1,0,0]) cube([edge_1_5_radius,y,edge_1_5_radius]);
      // }
      // smoothed_cube(
        // x=13,
        // y=5,
        // z=5,
        // edge_4_8_radius=2,
        // edge_3_7_radius=2
      // );
//
      // edge from vertex 4 to 8
      // translate([x - edge_4_8_radius, 0, z - edge_4_8_radius]) {
        // color([1,0,0]) cube([edge_4_8_radius,y, edge_4_8_radius]);
      // }

      // edge from vertex 4 to 8
      // translate([x - edge_4_8_radius, 0, z - edge_4_8_radius]) {
        // color([1,0,0]) cube([edge_4_8_radius,y, edge_4_8_radius]);
      // }
  // smooth edge from vertex 4 to 8
  // translate([x - edge_4_8_radius, 0, z - edge_4_8_radius]) {
    // rotate([0,90,0])
      // rotate([-90,0,0])
      // smoothed_edge(radius=edge_4_8_radius, height=y - radius_4 - radius_8);
  // }
// file: methods.scad
use <../cr_boxes/three_by_three/fan_container.scad>

// SmartAir S filter dimensions
// in millimeters
function get_filter_dim() = [10.5 * 25.4, 10.5 * 25.4, 96 - get_grid_z()];

// Number of rows and number columns
function get_num_fan_enclosure_dim() = [2,2];

function get_wall_depth() = 5;

function get_fan_enclosure_width() = get_width(
    get_filter_dim()[0],
    get_wall_depth(),
    get_num_fan_enclosure_dim()[0]
);

function get_fan_enclosure_length() = get_length(
    get_filter_dim()[1],
    get_wall_depth(),
    get_num_fan_enclosure_dim()[1]
);

// How tall the walls need to be. The higher the value, the more separation
// there is between the fans and the filter.
function get_grid_z() = 15;

function get_fan_diameter() = 120;

function get_fan_to_wall_spacing_dim() = [
  get_x_spacing(get_fan_enclosure_width(), get_fan_diameter()),
  get_y_spacing(get_fan_enclosure_width(), get_fan_diameter()),
  get_grid_z() + 25
];
function z_outerwall_offset() = 27 * 1.25;

function get_square_side_length() = 8;
// main file
use <filter_louvers_container.scad>

// height_offset should be one-off from the height offset in filter_louvers_container

difference() {
  translate([132,0,12]) {
    color([1,0,0]) cube([10,10,10], center=true);
  }

  louver(radius=get_louver_radius() + get_louver_radius_offset(), height_offset=get_height_offset() - 1);

}
